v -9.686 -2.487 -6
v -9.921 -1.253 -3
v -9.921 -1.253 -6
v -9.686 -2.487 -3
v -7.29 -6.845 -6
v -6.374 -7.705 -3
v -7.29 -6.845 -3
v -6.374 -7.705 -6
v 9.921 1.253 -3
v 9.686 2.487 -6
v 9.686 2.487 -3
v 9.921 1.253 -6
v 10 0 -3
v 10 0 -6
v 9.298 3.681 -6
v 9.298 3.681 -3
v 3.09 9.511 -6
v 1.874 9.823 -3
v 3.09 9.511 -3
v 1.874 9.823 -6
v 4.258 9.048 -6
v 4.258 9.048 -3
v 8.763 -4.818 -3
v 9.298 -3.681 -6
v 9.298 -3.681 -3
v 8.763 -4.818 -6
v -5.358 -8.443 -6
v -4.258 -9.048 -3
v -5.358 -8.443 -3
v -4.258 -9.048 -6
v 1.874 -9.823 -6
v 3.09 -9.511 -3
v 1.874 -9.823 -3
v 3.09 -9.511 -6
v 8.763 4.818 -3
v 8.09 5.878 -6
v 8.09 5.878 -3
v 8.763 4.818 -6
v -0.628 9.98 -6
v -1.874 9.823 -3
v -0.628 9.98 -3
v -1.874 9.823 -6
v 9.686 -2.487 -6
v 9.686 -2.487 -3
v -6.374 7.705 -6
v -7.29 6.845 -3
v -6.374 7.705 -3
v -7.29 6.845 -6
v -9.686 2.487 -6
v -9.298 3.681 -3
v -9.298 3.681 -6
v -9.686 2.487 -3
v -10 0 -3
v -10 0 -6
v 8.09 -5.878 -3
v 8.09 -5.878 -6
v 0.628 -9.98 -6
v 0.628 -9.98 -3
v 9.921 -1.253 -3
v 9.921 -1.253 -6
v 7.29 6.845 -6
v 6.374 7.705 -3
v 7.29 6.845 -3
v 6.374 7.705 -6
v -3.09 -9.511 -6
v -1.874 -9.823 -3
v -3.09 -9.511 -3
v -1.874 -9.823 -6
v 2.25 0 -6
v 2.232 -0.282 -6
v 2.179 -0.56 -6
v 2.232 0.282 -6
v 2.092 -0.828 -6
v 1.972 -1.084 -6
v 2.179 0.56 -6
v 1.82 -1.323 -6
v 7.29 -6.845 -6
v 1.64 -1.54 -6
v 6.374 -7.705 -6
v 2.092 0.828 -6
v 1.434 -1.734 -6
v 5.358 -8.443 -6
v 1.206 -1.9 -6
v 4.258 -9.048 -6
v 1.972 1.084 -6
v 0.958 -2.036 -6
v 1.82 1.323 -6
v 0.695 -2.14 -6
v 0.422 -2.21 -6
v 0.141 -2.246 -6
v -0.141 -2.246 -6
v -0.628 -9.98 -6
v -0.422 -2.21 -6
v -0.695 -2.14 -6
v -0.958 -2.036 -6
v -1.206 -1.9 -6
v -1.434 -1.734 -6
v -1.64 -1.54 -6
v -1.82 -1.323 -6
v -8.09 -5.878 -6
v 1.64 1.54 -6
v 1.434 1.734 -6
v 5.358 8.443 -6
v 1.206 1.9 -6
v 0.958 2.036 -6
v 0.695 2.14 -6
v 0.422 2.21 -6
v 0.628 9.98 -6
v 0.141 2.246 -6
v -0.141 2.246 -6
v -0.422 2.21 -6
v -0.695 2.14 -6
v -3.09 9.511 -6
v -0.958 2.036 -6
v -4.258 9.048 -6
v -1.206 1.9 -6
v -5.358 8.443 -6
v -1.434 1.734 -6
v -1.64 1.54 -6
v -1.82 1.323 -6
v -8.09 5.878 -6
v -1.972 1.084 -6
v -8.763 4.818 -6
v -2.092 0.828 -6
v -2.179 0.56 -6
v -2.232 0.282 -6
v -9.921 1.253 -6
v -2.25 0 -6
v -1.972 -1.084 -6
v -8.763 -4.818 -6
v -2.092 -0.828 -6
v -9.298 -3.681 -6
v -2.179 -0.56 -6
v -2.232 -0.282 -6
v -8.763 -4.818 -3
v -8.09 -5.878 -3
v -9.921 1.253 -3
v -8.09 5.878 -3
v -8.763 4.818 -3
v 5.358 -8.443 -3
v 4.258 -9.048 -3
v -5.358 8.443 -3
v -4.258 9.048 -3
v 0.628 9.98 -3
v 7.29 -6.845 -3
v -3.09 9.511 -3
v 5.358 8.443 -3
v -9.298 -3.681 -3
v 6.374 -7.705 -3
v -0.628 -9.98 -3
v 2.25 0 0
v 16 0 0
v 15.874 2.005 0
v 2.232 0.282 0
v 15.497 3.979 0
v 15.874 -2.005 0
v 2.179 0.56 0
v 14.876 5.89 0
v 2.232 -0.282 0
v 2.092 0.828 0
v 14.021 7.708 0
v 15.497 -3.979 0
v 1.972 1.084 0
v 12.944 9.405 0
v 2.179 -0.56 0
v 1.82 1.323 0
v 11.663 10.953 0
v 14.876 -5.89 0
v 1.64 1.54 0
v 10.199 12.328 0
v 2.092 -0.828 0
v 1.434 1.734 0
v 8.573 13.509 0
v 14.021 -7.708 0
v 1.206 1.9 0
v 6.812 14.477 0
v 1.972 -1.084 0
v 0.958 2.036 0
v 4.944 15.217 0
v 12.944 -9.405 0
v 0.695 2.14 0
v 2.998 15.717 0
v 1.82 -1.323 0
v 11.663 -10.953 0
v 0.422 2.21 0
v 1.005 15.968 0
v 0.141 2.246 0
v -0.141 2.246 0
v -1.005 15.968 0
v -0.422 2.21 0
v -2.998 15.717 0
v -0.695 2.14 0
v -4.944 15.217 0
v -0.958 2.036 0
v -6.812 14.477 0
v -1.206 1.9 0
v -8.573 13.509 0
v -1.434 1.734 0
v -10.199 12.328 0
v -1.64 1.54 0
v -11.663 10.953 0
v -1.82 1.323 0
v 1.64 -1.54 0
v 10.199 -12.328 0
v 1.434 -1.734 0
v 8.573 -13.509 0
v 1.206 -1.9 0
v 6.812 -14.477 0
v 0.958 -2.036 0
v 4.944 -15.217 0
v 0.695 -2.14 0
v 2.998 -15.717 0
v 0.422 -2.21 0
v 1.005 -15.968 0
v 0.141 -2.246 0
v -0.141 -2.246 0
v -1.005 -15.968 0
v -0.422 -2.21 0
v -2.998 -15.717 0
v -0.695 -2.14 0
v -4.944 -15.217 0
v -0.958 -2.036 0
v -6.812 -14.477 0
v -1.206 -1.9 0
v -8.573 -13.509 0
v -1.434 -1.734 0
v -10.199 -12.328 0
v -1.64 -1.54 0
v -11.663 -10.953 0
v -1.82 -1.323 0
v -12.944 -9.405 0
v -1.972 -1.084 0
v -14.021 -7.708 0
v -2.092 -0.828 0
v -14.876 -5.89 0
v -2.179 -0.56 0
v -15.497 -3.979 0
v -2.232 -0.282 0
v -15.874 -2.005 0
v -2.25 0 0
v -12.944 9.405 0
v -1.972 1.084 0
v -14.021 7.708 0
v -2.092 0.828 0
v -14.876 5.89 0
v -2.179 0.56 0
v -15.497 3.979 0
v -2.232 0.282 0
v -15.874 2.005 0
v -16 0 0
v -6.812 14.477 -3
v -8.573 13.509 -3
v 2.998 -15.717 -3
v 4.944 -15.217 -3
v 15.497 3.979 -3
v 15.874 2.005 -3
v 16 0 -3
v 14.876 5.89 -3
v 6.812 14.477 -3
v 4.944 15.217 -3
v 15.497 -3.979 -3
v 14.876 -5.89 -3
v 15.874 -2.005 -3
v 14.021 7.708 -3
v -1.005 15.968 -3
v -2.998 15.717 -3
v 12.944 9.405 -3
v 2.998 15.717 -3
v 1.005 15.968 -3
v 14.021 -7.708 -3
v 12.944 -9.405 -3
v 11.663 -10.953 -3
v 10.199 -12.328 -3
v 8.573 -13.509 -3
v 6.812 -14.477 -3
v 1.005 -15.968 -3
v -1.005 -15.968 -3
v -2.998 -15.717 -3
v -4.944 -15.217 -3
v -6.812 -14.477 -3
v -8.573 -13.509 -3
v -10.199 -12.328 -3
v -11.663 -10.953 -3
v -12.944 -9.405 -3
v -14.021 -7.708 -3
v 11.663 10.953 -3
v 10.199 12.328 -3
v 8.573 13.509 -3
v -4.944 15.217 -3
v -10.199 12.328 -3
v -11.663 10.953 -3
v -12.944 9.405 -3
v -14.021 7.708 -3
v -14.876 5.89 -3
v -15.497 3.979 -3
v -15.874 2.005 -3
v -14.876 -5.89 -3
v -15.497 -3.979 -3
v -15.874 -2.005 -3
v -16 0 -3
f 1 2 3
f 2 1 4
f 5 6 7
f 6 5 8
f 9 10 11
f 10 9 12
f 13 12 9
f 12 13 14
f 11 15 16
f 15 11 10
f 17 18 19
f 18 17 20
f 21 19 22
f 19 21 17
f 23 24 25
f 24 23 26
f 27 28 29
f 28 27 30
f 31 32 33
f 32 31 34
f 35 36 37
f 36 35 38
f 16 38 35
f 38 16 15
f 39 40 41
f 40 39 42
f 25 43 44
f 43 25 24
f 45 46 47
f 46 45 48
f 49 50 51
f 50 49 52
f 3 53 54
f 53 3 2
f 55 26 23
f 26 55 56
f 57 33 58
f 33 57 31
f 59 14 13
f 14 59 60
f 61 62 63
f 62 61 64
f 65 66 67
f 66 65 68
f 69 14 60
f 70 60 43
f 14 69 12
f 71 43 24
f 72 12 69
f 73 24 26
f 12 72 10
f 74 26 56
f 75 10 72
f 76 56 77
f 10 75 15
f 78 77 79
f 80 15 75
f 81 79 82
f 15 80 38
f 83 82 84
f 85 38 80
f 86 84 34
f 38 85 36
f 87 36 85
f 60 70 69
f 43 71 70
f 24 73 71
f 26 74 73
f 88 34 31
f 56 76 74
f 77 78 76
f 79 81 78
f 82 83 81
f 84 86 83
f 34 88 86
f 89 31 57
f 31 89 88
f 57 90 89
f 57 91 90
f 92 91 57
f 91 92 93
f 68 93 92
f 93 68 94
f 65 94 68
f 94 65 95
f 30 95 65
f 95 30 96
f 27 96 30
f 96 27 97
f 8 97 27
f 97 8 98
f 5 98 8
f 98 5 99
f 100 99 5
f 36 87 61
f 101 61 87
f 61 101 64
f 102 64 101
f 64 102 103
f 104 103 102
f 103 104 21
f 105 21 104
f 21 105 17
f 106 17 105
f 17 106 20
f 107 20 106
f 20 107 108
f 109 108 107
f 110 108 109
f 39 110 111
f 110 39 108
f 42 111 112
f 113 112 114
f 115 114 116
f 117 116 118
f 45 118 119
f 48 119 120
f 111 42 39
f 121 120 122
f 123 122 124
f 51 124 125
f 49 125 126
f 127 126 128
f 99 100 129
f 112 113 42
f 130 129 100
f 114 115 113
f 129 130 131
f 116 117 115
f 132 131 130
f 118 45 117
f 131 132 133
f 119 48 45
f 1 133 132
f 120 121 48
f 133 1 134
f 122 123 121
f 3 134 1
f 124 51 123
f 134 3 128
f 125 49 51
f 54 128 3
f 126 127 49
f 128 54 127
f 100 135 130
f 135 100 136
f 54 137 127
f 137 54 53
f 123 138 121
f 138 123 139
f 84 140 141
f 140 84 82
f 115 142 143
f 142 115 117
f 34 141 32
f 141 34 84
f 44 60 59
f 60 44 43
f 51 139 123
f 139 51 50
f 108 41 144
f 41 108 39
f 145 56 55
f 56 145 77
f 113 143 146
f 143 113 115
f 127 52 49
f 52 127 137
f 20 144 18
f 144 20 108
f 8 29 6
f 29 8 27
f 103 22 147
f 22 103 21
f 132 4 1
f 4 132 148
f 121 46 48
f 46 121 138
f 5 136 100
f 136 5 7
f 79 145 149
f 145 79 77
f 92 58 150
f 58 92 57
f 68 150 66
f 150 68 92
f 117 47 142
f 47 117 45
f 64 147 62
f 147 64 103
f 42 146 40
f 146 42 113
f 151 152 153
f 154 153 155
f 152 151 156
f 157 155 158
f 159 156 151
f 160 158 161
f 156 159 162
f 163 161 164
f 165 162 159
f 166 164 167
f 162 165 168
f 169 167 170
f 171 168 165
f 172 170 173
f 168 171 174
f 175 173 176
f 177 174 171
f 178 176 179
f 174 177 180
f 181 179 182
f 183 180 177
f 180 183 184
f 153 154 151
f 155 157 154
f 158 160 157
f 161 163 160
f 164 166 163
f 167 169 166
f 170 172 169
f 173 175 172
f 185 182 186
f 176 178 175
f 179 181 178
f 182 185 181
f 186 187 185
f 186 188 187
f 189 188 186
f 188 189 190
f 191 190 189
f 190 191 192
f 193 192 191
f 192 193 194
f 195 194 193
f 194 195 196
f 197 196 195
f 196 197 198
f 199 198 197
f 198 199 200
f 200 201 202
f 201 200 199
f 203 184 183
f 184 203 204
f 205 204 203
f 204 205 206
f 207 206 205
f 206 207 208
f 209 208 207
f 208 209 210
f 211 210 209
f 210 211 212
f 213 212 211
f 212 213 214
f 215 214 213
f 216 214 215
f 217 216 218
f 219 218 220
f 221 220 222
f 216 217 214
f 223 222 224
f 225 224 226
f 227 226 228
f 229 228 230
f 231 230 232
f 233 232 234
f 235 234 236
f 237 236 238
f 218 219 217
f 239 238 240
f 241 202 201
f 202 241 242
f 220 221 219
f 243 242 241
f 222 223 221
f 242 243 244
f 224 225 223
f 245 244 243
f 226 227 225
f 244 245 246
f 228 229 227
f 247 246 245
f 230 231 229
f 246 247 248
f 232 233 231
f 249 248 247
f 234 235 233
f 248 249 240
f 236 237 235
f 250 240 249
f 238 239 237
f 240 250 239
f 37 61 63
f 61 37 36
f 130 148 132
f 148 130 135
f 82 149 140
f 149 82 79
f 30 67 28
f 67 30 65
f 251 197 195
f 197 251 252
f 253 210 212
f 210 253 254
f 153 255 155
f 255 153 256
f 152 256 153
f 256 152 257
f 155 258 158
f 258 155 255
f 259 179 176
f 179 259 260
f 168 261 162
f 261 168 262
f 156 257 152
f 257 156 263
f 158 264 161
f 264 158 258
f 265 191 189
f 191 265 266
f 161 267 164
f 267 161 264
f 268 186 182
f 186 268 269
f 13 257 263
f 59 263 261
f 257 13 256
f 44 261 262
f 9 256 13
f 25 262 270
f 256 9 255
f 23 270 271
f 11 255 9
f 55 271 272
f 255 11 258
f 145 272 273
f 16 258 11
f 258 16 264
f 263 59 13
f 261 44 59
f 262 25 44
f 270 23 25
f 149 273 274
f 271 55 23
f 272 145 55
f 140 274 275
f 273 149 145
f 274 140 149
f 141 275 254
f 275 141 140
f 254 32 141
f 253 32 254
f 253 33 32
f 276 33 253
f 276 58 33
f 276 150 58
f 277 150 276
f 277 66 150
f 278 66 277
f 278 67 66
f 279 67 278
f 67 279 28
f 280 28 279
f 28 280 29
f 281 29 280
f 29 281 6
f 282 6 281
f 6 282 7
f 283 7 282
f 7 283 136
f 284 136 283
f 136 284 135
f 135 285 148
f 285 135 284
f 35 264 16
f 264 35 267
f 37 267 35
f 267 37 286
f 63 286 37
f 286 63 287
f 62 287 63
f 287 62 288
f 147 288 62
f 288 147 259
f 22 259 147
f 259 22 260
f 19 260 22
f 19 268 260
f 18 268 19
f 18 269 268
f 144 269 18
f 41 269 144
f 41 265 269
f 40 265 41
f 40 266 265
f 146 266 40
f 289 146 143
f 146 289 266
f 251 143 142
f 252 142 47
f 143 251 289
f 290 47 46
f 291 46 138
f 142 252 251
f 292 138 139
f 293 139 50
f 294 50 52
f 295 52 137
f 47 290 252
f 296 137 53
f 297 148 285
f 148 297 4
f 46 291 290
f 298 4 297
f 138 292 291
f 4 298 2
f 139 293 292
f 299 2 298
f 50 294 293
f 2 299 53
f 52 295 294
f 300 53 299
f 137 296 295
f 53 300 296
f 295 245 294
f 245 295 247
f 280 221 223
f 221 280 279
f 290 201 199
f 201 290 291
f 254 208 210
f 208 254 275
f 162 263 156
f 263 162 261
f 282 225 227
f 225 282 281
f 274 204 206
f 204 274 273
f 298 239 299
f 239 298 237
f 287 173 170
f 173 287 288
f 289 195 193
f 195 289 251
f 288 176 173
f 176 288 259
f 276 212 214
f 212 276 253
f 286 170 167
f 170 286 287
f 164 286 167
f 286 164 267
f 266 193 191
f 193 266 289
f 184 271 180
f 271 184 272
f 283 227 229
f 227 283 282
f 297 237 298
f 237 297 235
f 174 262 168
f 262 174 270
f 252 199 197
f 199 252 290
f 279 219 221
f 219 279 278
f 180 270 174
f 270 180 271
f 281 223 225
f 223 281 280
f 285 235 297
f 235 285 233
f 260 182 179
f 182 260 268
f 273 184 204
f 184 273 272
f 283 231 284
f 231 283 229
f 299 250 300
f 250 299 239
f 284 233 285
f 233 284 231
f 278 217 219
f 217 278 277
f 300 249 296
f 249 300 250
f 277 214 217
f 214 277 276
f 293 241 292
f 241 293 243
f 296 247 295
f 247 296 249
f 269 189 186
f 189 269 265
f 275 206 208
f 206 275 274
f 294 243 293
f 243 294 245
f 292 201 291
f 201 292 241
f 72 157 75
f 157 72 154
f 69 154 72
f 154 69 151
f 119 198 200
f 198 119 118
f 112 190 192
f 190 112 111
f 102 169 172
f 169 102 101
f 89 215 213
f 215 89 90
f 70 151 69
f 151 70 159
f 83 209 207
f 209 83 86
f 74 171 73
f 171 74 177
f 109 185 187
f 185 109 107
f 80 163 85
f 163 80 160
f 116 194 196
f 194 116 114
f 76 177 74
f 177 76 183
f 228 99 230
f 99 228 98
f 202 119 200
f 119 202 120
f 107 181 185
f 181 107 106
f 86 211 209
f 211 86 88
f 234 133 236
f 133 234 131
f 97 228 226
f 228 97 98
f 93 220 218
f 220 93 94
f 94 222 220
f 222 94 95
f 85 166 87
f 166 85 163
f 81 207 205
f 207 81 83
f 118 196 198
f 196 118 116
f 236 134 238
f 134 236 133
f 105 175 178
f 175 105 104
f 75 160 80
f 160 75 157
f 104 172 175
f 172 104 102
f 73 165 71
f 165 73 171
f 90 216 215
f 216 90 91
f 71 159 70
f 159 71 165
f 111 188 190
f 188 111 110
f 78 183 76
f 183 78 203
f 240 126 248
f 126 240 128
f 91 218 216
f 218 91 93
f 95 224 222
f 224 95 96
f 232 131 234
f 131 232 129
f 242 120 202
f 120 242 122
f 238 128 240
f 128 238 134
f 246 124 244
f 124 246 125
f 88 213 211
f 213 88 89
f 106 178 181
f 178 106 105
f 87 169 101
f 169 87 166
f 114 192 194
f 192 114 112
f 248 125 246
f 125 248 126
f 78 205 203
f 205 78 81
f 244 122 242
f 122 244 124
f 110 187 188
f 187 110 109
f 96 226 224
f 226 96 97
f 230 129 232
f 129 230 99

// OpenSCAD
$fn = 50;


difference() {
	union() {
		translate(v = [0, 0, -6.0000000000]) {
			cylinder(h = 6, r = 10.0000000000);
		}
		translate(v = [0, 0, -3.0000000000]) {
			cylinder(h = 3, r = 16.0000000000);
		}
	}
	union() {
		#translate(v = [0, 0, -6]) {
			cylinder(h = 6, r = 2.2500000000);
		}
	}
}
